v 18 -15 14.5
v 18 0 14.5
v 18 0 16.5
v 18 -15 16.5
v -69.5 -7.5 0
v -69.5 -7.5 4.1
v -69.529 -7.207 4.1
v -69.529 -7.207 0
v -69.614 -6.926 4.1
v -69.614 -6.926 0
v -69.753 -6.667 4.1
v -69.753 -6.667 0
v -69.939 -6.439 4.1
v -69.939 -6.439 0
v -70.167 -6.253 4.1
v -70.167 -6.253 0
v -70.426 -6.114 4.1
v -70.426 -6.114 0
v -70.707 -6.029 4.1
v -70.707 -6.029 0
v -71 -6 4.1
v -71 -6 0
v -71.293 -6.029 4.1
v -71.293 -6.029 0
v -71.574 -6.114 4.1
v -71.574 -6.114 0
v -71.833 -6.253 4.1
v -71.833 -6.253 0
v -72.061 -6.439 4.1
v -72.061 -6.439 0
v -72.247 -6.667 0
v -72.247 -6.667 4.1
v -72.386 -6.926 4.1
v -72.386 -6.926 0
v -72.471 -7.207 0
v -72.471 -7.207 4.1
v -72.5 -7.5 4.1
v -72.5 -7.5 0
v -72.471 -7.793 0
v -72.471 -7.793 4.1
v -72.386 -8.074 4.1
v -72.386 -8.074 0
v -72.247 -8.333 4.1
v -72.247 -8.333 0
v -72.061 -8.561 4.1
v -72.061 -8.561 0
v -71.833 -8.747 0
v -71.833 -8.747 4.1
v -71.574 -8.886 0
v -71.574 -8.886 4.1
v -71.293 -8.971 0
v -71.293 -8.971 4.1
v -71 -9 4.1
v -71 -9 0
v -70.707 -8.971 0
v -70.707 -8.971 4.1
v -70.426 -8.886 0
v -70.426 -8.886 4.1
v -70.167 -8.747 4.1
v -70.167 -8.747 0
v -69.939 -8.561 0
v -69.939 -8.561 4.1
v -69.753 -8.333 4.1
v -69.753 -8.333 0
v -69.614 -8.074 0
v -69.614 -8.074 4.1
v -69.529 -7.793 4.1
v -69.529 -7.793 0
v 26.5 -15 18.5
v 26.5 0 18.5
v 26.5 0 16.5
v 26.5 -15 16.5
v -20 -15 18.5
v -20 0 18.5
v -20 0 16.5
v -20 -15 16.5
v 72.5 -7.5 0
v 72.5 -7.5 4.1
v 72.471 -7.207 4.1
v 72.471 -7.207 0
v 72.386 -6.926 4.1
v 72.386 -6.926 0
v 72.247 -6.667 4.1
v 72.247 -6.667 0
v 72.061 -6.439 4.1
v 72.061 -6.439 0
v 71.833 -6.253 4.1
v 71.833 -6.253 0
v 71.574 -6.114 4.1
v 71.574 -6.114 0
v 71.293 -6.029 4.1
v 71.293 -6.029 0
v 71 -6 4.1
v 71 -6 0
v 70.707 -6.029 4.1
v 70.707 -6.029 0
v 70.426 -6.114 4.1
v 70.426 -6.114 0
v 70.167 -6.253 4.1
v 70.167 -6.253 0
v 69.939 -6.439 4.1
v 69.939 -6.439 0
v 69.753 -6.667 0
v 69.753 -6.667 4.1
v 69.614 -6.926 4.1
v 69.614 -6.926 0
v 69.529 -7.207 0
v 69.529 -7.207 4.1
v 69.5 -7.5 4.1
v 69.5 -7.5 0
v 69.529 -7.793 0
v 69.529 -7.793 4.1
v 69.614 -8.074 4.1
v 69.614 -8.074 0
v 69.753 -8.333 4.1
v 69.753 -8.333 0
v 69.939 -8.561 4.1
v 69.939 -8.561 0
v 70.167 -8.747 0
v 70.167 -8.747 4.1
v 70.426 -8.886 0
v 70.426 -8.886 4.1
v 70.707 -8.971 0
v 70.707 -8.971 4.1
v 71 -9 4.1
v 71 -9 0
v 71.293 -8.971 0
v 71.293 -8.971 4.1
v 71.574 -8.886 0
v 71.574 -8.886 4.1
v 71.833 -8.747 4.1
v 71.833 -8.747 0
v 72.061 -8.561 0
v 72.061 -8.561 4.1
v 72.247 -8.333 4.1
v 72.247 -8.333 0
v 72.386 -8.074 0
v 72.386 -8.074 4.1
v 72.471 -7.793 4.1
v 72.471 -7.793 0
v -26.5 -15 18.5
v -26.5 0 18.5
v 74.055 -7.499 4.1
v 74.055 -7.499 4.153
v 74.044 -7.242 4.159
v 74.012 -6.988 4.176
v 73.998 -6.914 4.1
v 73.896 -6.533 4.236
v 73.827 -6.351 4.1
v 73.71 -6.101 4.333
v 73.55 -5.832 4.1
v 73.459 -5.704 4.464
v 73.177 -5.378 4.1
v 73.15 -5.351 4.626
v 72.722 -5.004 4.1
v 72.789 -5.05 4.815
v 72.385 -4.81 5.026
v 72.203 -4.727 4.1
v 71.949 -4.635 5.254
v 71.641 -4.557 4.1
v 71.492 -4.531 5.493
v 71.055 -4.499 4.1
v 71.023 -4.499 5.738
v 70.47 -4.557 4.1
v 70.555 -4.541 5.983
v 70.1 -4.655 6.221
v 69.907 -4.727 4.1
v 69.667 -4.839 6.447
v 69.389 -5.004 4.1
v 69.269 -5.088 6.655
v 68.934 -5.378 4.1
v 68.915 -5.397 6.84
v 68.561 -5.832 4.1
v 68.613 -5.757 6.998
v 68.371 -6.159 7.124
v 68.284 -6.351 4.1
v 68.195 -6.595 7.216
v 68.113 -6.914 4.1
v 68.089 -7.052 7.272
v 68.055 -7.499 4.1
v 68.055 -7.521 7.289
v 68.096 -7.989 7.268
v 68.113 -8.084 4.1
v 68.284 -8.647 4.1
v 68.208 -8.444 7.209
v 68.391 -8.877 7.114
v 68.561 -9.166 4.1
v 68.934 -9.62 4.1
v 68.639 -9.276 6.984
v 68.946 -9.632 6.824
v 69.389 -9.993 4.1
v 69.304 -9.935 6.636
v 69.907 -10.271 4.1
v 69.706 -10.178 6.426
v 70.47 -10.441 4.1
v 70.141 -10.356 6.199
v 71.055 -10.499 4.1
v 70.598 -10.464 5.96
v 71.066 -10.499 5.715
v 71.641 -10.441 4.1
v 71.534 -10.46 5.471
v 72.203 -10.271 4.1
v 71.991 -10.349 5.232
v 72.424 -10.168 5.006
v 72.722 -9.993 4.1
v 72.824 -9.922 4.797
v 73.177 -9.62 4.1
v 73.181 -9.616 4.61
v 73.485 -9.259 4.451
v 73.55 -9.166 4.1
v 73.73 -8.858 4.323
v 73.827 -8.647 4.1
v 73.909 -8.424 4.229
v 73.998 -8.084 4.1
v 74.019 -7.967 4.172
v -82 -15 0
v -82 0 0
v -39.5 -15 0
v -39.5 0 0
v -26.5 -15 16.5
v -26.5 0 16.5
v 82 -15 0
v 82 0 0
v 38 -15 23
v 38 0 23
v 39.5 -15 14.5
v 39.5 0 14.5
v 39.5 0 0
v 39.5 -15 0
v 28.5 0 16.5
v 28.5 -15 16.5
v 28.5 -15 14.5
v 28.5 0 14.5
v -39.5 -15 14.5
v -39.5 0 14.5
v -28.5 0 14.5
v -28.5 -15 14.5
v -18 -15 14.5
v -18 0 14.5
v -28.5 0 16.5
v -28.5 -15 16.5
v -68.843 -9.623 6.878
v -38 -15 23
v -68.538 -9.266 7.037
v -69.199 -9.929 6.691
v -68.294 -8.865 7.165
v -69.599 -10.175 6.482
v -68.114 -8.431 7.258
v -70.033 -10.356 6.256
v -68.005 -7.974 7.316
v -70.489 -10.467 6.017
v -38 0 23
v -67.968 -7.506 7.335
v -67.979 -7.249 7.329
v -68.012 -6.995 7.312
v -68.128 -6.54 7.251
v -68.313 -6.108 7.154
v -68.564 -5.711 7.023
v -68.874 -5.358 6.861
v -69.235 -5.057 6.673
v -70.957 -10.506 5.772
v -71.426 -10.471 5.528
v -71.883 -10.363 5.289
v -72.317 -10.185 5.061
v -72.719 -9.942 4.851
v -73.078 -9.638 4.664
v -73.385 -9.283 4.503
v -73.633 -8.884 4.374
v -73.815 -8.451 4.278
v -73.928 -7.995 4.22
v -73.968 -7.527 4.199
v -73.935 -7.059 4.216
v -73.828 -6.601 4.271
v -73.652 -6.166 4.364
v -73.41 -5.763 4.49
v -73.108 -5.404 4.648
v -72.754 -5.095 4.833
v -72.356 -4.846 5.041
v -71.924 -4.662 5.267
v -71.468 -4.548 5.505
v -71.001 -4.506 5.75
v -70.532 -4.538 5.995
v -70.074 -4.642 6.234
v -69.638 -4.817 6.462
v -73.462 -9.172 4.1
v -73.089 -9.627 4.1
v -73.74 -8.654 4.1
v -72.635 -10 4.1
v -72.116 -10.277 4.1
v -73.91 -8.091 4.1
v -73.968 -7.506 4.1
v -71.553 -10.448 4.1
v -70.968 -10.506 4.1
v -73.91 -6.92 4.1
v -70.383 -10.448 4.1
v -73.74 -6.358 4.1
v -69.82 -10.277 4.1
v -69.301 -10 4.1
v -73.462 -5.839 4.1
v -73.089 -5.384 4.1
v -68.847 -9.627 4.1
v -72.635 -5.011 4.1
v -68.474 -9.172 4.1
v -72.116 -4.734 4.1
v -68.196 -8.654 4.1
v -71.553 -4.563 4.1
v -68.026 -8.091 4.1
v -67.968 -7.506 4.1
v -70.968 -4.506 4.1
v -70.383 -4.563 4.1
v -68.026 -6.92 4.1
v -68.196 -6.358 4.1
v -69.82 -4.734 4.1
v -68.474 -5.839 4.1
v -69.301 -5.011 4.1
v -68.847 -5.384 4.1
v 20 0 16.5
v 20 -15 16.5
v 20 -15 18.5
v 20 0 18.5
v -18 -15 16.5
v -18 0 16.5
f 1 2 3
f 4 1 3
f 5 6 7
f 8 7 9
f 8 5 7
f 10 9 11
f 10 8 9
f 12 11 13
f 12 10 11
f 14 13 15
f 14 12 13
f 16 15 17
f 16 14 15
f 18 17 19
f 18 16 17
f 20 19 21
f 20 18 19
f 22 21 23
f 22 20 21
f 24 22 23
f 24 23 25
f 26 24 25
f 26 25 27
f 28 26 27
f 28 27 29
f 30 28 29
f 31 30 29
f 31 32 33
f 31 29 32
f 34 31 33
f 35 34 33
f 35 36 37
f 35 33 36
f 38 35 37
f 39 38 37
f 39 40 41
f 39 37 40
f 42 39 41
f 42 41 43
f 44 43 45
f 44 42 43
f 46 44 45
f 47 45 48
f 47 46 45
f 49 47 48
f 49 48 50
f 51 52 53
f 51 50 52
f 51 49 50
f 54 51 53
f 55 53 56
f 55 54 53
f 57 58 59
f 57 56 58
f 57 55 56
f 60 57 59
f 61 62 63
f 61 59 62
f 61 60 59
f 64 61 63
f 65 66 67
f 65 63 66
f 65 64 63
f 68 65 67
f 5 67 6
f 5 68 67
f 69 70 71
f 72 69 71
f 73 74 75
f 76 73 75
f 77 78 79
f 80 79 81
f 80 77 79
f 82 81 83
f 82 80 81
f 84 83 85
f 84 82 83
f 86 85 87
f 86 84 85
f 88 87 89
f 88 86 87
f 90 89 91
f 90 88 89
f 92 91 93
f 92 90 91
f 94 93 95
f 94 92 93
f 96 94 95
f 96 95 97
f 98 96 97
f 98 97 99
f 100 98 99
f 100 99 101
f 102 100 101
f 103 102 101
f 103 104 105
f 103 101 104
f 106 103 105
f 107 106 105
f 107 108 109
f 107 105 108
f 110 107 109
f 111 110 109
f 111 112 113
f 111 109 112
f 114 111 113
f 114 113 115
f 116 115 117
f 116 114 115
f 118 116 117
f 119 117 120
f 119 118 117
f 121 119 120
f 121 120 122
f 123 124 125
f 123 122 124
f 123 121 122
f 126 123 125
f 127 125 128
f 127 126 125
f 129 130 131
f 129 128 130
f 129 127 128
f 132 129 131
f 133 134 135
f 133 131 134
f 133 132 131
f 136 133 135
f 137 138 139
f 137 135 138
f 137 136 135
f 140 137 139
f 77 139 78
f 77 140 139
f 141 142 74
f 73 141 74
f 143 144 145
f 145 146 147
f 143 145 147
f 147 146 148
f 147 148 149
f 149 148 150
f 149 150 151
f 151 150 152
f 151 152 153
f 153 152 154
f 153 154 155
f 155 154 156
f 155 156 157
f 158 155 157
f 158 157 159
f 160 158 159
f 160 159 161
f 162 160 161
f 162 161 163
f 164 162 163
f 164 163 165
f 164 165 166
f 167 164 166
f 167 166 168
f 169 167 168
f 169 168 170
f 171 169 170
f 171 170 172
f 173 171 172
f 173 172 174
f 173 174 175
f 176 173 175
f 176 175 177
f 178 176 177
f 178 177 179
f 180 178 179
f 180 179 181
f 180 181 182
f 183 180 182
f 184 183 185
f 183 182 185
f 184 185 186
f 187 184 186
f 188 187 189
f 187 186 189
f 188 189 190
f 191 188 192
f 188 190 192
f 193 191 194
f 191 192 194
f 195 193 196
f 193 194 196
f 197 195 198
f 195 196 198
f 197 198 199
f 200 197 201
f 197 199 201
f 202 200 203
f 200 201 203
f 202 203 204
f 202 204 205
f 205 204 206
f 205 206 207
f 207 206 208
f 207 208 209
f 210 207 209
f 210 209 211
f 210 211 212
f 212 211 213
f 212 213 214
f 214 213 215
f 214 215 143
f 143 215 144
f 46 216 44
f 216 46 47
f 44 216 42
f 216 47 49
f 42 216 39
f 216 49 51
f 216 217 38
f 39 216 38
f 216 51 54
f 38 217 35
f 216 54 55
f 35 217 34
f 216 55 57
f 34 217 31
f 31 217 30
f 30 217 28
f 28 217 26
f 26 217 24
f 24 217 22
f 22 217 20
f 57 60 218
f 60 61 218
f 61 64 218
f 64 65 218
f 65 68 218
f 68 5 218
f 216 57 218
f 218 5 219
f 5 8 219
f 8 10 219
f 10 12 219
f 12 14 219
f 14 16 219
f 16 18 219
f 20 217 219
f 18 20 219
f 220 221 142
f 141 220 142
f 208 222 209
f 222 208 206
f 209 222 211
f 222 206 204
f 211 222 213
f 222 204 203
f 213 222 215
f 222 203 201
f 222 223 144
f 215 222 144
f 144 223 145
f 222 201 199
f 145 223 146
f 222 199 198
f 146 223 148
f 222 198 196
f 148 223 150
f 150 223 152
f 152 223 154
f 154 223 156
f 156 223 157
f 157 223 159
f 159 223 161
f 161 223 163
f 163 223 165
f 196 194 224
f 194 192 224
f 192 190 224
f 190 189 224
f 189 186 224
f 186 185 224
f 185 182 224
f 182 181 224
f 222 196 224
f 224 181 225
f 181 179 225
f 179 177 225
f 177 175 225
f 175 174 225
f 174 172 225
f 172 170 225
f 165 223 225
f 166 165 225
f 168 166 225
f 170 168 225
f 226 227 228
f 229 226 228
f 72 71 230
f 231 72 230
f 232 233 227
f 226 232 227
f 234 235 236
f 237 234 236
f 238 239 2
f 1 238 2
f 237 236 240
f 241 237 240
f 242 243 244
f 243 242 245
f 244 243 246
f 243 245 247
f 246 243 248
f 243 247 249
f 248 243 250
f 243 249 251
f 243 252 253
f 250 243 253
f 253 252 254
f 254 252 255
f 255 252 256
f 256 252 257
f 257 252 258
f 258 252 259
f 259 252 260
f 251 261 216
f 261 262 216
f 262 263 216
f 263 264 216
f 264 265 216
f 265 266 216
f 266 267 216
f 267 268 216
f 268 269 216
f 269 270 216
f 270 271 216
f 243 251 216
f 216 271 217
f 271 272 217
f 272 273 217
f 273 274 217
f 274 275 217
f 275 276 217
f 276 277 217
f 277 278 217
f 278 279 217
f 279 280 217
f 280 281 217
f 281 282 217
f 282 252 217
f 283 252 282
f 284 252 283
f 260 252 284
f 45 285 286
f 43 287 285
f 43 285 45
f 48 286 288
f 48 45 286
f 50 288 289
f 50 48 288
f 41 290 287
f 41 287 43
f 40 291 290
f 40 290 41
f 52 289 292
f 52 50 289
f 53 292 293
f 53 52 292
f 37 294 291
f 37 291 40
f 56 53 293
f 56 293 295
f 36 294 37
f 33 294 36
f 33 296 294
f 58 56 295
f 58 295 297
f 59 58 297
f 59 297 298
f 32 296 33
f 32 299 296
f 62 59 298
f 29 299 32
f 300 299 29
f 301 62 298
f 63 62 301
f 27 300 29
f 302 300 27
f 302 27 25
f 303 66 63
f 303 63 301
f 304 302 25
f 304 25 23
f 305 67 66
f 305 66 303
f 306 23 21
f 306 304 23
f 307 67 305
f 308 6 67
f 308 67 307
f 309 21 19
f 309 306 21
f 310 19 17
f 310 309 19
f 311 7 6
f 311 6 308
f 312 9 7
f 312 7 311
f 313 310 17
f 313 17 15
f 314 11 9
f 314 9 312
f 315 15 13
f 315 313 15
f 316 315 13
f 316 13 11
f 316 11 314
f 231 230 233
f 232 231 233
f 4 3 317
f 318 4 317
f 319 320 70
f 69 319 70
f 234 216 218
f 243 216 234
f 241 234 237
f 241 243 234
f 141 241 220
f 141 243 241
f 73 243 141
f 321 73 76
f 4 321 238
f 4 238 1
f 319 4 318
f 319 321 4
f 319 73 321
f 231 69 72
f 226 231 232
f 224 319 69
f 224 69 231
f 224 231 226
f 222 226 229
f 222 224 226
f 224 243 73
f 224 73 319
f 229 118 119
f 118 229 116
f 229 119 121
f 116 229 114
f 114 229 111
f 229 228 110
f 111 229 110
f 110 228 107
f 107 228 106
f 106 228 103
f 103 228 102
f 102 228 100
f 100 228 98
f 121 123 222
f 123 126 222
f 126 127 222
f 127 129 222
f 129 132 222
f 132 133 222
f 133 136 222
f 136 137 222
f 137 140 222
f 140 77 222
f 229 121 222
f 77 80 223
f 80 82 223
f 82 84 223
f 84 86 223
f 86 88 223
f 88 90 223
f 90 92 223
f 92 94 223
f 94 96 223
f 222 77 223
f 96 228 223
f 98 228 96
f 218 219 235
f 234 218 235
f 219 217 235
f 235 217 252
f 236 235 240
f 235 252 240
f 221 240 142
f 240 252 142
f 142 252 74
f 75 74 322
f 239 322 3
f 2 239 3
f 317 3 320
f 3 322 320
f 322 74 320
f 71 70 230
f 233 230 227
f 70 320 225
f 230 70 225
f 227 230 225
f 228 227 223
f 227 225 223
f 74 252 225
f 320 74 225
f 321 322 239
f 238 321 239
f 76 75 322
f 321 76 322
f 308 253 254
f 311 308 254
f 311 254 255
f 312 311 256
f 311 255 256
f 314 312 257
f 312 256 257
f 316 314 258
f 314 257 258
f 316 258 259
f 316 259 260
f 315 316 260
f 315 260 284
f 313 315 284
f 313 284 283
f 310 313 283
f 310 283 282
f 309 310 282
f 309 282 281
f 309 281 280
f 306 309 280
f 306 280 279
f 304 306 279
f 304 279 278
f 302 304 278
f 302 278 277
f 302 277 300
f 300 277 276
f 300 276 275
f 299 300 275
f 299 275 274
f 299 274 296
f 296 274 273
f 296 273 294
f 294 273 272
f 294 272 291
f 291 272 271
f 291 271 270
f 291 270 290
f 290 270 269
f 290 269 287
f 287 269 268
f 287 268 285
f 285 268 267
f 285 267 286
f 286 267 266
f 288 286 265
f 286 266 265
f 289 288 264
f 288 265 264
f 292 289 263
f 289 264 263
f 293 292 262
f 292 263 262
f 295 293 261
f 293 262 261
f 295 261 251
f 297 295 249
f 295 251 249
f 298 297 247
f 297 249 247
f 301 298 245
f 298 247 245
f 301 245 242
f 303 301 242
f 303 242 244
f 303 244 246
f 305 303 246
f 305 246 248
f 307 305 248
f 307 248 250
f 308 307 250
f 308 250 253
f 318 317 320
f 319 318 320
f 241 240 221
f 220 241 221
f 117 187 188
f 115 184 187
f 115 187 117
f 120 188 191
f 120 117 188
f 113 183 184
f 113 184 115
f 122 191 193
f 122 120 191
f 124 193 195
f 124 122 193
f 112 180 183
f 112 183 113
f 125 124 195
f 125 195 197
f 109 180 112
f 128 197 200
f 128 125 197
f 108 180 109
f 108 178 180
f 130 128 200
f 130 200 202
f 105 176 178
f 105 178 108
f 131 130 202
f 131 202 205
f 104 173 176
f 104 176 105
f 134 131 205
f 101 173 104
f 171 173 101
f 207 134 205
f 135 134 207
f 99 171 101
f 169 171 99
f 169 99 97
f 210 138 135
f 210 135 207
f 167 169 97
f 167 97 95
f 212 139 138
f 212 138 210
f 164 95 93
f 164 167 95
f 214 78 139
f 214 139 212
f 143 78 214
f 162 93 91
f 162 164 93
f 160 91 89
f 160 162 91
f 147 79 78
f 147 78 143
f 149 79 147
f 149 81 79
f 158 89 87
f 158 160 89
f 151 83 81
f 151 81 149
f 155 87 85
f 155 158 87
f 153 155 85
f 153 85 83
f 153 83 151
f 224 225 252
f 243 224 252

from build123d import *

# Parameters (mm, degrees)
F2_DEPTH = 15
F3_R     = 1.5
F4_DEPTH = 23.001
F5_R     = 3
F6_DEPTH = 4.5
F9_DEPTH = 4.3


with BuildPart() as f2:
    # F1 (on Front) → F2 (new body)
    with BuildSketch(Plane.XZ):
        Polygon((-82, 0), (-39.5, 0), (-39.5, 14.5), (-28.5, 14.5), (-28.5, 16.5), (-26.5, 16.5), (-26.5, 18.5), (-20, 18.5), (-20, 16.5), (-18, 16.5), (-18, 14.5), (0, 14.5), (18, 14.5), (18, 16.5), (20, 16.5), (20, 18.5), (26.5, 18.5), (26.5, 16.5), (28.5, 16.5), (28.5, 14.5), (39.5, 14.5), (39.5, 0), (82, 0), (38, 23), (0, 23), (-38, 23), align=None)
    extrude(amount=F2_DEPTH)

    # F3 (on Top) → F4 (cut, through all)
    with BuildSketch(Plane.XY):
        with Locations((71, -7.5)):
            Circle(F3_R)
        with Locations((-71, -7.5)):
            Circle(F3_R)
    extrude(amount=F4_DEPTH, mode=Mode.SUBTRACT)

    # F5 (on offset) → F6 (cut)
    with BuildSketch(Plane.XY.offset(8.6)):
        with Locations((-70.968017, -7.505668)):
            Circle(F5_R)
        with Locations((71.05542, -7.498881)):
            Circle(F5_R)
    extrude(amount=-F6_DEPTH, mode=Mode.SUBTRACT)

    # F8 (on offset) → F9 (join)
    with BuildSketch(Plane.XY.offset(23)):
        Polygon((38, -15), (38, -13.471063), (7.746612, -7.5), (38, -1.528937), (38, 0), (30.253388, 0), (0, -5.971063), (-30.253388, 0), (-38, 0), (-38, -1.528937), (-7.746612, -7.5), (-38, -13.471063), (-38, -15), (-30.253388, -15), (0, -9.028937), (30.253388, -15), align=None)
    extrude(amount=-F9_DEPTH)


solid = f2.part
